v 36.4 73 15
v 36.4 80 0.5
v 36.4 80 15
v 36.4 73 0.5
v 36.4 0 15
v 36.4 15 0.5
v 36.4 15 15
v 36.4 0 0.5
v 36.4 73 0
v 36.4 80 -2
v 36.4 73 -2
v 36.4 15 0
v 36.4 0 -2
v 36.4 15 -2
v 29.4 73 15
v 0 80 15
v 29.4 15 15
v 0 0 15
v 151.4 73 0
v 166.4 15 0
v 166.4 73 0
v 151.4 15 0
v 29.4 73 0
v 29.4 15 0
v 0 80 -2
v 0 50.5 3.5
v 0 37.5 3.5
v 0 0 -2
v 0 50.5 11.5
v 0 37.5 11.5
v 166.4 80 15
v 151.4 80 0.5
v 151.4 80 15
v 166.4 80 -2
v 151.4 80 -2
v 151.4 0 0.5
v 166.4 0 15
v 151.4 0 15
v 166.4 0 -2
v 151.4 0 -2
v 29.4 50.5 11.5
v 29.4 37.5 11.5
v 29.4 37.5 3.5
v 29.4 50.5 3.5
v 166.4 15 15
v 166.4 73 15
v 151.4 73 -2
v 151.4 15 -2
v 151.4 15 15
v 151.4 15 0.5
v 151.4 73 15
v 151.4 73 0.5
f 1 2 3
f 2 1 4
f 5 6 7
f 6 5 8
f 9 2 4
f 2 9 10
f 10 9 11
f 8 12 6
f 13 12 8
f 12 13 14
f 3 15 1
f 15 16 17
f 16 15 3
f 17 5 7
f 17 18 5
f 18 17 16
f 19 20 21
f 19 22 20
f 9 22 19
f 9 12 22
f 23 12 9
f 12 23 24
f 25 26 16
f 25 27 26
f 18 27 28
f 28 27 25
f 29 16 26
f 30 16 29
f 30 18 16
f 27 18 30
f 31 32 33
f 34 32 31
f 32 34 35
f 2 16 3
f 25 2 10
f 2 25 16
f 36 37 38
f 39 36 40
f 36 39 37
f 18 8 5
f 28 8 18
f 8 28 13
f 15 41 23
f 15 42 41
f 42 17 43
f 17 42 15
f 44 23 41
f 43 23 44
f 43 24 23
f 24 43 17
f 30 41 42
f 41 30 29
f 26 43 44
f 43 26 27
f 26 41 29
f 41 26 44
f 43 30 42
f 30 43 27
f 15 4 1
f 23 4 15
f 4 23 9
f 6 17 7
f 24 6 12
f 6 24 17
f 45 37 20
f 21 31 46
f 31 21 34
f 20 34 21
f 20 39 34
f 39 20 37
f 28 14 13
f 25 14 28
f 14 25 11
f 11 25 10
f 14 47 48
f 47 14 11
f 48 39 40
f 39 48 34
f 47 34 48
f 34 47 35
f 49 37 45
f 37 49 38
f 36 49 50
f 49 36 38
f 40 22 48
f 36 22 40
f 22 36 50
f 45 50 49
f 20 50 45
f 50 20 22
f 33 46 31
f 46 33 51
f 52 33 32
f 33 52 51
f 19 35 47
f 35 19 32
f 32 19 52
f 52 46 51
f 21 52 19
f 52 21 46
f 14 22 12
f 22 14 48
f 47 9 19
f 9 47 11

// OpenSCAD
// Grundmaße
wanddicke = 2;
breite = 162.4 + (2*wanddicke);
hoehe = 80;
basisdicke = 2;  // Dicke der Grundplatte nach unten

// Verdickungsparameter
verdickung_hoehe = 15;
verdickung_breite_links = 15;
verdickung_breite_rechts = 5;
verdickung_tiefe = 15;

// Abstände und Positionen
abstand_zwischen_bloecken = 58;
rechter_rand = 130;
fuell_ende_pos = breite - rechter_rand;

// Einkerbung und Bohrung
kerbe_tiefe = 7;
kerbe_breite = abstand_zwischen_bloecken;
bohrung_hoehe = 13;
bohrung_tiefe = 8;

// Berechne maximalen Abstand (damit obere Verdickung passt)
max_abstand = hoehe - verdickung_tiefe - 5;
aktueller_abstand = min(abstand_zwischen_bloecken, max_abstand);

// Positionen berechnen
oberer_block_y = verdickung_tiefe + aktueller_abstand;
oberer_block_tiefe = hoehe - oberer_block_y;
mitte_y = verdickung_tiefe + aktueller_abstand/2;

// Lücke zwischen den Verdickungen
luecke_breite = breite - verdickung_breite_links - fuell_ende_pos;

// Hauptmodell
difference() {
    union() {
        // Grundplatte (nach unten wachsend)
        translate([0, 0, -basisdicke]) 
            cube([breite, hoehe, basisdicke]);
        
        // Verdickung links unten
        translate([breite - verdickung_breite_links, 0, 0]) 
            cube([verdickung_breite_links, verdickung_tiefe, verdickung_hoehe]);
        
        // Verdickung links oben (nur wenn genug Platz)
        if (hoehe > verdickung_tiefe + 5) {
            translate([breite - verdickung_breite_links, oberer_block_y, 0]) 
                cube([verdickung_breite_links, oberer_block_tiefe, verdickung_hoehe]);
        }
        
        // Aufgefüllter Bereich rechts
        difference() {
            translate([0, 0, 0]) 
                cube([fuell_ende_pos, hoehe, verdickung_hoehe]);
            
            // Bohrung
            translate([0, mitte_y - bohrung_hoehe/2, verdickung_hoehe/2 - bohrung_tiefe/2]) 
                cube([fuell_ende_pos - kerbe_tiefe, bohrung_hoehe, bohrung_tiefe]);
            
            // Einkerbung
            translate([fuell_ende_pos - kerbe_tiefe, mitte_y - kerbe_breite/2, 0]) 
                cube([kerbe_tiefe, kerbe_breite, verdickung_hoehe]);
        }
    }
    
    // Löcher in der Deckschicht zwischen den Verdickungen
    translate([fuell_ende_pos, 0, -basisdicke - 0.5]) 
        cube([luecke_breite, verdickung_tiefe, basisdicke + 1]);
        
    translate([fuell_ende_pos, oberer_block_y, -basisdicke - 0.5]) 
        cube([luecke_breite, oberer_block_tiefe, basisdicke + 1]);
}
